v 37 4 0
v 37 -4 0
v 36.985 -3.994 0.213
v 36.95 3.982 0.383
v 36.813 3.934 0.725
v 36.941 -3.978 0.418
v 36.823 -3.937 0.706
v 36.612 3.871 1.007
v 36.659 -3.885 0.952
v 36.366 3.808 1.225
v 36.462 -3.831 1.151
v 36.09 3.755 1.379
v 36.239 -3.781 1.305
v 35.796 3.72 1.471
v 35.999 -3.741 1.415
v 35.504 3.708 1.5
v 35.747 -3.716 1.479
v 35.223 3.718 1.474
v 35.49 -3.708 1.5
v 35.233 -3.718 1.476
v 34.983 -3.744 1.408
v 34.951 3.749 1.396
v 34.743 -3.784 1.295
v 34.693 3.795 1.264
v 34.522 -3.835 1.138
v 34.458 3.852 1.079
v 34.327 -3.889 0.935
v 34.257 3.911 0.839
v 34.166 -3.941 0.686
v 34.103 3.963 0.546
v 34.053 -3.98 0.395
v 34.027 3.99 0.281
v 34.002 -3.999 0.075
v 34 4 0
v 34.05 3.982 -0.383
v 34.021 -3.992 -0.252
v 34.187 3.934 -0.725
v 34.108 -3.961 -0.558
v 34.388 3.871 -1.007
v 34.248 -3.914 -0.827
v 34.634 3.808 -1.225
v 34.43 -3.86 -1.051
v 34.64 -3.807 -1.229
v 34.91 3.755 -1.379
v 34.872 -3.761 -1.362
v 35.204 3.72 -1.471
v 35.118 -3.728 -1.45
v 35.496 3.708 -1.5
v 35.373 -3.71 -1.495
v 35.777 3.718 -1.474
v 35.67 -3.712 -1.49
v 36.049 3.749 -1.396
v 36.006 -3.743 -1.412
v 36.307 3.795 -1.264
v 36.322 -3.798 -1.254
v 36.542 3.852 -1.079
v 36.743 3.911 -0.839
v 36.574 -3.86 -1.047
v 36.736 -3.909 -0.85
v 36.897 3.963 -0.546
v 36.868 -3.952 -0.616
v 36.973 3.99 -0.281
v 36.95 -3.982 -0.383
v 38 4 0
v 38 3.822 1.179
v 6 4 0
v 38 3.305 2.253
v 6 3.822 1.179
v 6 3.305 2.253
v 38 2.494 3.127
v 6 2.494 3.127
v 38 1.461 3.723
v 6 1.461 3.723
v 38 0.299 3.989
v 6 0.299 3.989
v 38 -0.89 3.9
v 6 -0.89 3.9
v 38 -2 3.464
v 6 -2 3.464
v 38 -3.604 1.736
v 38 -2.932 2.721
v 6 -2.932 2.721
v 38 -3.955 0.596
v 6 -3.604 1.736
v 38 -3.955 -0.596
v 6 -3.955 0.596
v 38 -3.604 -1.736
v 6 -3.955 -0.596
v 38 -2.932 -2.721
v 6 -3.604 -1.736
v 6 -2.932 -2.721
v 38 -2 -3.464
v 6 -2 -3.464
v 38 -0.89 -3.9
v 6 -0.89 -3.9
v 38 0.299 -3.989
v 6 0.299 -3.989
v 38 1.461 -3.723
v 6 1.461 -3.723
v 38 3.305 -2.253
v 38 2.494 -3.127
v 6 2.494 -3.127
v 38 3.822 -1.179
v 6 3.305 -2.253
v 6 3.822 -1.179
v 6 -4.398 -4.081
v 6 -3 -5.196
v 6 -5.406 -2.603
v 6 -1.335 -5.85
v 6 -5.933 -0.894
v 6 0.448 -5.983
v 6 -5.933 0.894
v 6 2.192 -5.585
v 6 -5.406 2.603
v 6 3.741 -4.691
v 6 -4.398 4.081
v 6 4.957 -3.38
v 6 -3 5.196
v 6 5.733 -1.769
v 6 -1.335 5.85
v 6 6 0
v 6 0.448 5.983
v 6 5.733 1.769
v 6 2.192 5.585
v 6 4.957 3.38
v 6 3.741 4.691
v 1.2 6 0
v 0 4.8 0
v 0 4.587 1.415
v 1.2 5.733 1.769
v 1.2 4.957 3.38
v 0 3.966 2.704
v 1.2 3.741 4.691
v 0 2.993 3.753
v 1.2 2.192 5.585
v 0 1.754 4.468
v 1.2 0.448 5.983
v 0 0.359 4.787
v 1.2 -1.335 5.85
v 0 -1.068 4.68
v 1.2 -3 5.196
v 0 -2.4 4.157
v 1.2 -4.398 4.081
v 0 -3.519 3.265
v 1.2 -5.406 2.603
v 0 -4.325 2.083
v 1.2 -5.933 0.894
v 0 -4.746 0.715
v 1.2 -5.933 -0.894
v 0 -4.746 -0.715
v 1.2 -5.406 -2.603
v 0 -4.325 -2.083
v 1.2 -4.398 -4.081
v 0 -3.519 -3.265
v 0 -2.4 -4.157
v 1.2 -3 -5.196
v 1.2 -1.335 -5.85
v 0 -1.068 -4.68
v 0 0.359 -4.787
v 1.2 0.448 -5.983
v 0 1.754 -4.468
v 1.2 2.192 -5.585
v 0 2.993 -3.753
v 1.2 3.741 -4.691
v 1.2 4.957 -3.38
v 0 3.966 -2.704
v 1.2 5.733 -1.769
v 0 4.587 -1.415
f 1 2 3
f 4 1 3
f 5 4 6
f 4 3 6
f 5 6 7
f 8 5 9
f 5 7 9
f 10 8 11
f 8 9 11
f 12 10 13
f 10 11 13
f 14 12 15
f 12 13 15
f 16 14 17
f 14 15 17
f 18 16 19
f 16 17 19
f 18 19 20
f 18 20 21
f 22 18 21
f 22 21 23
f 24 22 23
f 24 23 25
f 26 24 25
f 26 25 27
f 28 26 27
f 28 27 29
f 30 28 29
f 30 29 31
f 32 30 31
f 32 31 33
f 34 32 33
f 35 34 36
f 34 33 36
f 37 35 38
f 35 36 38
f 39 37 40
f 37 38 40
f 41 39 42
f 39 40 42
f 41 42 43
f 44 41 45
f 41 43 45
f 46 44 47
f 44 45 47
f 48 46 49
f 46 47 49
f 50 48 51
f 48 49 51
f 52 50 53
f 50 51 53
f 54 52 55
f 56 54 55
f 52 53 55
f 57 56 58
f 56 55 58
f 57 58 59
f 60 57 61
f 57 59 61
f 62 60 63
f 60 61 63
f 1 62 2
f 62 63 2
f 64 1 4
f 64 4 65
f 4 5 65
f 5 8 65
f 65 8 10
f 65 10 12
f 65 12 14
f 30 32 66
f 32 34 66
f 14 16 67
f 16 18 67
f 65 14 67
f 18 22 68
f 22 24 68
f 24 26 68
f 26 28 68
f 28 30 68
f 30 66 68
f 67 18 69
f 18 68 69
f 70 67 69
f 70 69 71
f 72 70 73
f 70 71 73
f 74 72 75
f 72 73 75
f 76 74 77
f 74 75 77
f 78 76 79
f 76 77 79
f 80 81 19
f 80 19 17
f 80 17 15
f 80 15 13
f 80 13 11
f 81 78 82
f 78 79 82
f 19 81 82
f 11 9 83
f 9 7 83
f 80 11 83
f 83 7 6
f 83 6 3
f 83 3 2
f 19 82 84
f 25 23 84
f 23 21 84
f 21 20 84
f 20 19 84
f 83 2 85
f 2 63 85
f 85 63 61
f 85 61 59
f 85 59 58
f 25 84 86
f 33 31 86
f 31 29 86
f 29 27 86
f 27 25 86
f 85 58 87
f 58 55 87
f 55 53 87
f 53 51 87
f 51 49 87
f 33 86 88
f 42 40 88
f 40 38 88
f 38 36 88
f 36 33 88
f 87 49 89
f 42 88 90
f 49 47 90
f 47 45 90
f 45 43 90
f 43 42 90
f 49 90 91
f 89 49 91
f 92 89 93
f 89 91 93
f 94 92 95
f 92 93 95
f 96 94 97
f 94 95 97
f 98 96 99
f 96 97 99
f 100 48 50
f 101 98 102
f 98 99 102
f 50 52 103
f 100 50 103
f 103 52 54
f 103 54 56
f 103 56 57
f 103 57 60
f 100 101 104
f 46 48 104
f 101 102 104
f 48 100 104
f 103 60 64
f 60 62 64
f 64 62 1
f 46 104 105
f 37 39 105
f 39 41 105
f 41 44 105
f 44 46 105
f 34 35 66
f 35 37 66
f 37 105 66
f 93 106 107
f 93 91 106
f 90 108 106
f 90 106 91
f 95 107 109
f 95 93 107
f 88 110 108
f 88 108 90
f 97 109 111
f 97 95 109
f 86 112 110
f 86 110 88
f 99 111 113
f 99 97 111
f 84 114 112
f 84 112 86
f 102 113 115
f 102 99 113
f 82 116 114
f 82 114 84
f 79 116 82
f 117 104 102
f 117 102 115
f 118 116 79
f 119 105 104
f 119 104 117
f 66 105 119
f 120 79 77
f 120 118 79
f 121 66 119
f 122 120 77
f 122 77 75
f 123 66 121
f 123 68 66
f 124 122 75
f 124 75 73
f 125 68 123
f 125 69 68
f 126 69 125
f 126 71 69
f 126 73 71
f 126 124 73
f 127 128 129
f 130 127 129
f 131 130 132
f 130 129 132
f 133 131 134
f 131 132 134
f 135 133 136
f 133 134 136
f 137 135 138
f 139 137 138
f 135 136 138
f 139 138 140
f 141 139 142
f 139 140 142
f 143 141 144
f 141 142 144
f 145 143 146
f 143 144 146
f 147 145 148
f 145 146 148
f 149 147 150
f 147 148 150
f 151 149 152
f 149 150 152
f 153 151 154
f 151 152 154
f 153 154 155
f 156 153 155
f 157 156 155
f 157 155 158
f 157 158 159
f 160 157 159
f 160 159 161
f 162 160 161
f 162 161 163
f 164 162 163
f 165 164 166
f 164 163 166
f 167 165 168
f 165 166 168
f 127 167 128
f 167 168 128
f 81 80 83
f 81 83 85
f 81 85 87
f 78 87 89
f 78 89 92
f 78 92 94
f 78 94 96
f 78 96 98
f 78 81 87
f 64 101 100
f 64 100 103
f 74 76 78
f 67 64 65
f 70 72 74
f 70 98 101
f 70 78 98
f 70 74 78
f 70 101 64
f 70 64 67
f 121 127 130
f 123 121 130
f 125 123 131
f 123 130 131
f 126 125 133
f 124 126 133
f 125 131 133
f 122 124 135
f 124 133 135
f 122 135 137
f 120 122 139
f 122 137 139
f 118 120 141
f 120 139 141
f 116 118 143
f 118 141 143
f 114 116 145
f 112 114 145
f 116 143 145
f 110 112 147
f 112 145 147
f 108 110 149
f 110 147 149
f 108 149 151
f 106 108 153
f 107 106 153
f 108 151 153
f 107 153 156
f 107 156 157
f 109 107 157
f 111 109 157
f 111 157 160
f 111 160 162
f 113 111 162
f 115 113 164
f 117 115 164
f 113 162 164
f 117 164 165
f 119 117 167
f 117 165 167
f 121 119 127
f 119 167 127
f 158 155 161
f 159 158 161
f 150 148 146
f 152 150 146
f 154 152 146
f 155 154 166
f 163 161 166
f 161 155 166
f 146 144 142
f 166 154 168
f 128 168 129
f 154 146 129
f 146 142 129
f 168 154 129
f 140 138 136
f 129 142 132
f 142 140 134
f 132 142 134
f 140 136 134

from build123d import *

# Parameters (mm, degrees)
F0_R     = 4
F1_DEPTH = 38
F0_R_2   = 6
F2_DEPTH = 6
F3_SIZE  = 1.2
F4_R     = 1.5
F5_DEPTH = 4


with BuildPart() as f1:
    # F0 (on Right) → F1 (new body)
    with BuildSketch(Plane.YZ):
        Circle(F0_R)
    extrude(amount=F1_DEPTH)

    # F0 (on Right) → F2 (join)
    with BuildSketch(Plane.YZ):
        Circle(F0_R_2)
        Circle(F0_R, mode=Mode.SUBTRACT)
    extrude(amount=F2_DEPTH)

    # F3
    f3_edges = [f1.edges().sort_by_distance(p)[0] for p in [
        (0, -6, 0),
    ]]
    chamfer(f3_edges, length=F3_SIZE)

    # F4 (on Front) → F5 (cut, symmetric)
    with BuildSketch(Plane.XZ):
        with Locations((35.5, 0)):
            Circle(F4_R)
    extrude(amount=F5_DEPTH, both=True, mode=Mode.SUBTRACT)


solid = f1.part
